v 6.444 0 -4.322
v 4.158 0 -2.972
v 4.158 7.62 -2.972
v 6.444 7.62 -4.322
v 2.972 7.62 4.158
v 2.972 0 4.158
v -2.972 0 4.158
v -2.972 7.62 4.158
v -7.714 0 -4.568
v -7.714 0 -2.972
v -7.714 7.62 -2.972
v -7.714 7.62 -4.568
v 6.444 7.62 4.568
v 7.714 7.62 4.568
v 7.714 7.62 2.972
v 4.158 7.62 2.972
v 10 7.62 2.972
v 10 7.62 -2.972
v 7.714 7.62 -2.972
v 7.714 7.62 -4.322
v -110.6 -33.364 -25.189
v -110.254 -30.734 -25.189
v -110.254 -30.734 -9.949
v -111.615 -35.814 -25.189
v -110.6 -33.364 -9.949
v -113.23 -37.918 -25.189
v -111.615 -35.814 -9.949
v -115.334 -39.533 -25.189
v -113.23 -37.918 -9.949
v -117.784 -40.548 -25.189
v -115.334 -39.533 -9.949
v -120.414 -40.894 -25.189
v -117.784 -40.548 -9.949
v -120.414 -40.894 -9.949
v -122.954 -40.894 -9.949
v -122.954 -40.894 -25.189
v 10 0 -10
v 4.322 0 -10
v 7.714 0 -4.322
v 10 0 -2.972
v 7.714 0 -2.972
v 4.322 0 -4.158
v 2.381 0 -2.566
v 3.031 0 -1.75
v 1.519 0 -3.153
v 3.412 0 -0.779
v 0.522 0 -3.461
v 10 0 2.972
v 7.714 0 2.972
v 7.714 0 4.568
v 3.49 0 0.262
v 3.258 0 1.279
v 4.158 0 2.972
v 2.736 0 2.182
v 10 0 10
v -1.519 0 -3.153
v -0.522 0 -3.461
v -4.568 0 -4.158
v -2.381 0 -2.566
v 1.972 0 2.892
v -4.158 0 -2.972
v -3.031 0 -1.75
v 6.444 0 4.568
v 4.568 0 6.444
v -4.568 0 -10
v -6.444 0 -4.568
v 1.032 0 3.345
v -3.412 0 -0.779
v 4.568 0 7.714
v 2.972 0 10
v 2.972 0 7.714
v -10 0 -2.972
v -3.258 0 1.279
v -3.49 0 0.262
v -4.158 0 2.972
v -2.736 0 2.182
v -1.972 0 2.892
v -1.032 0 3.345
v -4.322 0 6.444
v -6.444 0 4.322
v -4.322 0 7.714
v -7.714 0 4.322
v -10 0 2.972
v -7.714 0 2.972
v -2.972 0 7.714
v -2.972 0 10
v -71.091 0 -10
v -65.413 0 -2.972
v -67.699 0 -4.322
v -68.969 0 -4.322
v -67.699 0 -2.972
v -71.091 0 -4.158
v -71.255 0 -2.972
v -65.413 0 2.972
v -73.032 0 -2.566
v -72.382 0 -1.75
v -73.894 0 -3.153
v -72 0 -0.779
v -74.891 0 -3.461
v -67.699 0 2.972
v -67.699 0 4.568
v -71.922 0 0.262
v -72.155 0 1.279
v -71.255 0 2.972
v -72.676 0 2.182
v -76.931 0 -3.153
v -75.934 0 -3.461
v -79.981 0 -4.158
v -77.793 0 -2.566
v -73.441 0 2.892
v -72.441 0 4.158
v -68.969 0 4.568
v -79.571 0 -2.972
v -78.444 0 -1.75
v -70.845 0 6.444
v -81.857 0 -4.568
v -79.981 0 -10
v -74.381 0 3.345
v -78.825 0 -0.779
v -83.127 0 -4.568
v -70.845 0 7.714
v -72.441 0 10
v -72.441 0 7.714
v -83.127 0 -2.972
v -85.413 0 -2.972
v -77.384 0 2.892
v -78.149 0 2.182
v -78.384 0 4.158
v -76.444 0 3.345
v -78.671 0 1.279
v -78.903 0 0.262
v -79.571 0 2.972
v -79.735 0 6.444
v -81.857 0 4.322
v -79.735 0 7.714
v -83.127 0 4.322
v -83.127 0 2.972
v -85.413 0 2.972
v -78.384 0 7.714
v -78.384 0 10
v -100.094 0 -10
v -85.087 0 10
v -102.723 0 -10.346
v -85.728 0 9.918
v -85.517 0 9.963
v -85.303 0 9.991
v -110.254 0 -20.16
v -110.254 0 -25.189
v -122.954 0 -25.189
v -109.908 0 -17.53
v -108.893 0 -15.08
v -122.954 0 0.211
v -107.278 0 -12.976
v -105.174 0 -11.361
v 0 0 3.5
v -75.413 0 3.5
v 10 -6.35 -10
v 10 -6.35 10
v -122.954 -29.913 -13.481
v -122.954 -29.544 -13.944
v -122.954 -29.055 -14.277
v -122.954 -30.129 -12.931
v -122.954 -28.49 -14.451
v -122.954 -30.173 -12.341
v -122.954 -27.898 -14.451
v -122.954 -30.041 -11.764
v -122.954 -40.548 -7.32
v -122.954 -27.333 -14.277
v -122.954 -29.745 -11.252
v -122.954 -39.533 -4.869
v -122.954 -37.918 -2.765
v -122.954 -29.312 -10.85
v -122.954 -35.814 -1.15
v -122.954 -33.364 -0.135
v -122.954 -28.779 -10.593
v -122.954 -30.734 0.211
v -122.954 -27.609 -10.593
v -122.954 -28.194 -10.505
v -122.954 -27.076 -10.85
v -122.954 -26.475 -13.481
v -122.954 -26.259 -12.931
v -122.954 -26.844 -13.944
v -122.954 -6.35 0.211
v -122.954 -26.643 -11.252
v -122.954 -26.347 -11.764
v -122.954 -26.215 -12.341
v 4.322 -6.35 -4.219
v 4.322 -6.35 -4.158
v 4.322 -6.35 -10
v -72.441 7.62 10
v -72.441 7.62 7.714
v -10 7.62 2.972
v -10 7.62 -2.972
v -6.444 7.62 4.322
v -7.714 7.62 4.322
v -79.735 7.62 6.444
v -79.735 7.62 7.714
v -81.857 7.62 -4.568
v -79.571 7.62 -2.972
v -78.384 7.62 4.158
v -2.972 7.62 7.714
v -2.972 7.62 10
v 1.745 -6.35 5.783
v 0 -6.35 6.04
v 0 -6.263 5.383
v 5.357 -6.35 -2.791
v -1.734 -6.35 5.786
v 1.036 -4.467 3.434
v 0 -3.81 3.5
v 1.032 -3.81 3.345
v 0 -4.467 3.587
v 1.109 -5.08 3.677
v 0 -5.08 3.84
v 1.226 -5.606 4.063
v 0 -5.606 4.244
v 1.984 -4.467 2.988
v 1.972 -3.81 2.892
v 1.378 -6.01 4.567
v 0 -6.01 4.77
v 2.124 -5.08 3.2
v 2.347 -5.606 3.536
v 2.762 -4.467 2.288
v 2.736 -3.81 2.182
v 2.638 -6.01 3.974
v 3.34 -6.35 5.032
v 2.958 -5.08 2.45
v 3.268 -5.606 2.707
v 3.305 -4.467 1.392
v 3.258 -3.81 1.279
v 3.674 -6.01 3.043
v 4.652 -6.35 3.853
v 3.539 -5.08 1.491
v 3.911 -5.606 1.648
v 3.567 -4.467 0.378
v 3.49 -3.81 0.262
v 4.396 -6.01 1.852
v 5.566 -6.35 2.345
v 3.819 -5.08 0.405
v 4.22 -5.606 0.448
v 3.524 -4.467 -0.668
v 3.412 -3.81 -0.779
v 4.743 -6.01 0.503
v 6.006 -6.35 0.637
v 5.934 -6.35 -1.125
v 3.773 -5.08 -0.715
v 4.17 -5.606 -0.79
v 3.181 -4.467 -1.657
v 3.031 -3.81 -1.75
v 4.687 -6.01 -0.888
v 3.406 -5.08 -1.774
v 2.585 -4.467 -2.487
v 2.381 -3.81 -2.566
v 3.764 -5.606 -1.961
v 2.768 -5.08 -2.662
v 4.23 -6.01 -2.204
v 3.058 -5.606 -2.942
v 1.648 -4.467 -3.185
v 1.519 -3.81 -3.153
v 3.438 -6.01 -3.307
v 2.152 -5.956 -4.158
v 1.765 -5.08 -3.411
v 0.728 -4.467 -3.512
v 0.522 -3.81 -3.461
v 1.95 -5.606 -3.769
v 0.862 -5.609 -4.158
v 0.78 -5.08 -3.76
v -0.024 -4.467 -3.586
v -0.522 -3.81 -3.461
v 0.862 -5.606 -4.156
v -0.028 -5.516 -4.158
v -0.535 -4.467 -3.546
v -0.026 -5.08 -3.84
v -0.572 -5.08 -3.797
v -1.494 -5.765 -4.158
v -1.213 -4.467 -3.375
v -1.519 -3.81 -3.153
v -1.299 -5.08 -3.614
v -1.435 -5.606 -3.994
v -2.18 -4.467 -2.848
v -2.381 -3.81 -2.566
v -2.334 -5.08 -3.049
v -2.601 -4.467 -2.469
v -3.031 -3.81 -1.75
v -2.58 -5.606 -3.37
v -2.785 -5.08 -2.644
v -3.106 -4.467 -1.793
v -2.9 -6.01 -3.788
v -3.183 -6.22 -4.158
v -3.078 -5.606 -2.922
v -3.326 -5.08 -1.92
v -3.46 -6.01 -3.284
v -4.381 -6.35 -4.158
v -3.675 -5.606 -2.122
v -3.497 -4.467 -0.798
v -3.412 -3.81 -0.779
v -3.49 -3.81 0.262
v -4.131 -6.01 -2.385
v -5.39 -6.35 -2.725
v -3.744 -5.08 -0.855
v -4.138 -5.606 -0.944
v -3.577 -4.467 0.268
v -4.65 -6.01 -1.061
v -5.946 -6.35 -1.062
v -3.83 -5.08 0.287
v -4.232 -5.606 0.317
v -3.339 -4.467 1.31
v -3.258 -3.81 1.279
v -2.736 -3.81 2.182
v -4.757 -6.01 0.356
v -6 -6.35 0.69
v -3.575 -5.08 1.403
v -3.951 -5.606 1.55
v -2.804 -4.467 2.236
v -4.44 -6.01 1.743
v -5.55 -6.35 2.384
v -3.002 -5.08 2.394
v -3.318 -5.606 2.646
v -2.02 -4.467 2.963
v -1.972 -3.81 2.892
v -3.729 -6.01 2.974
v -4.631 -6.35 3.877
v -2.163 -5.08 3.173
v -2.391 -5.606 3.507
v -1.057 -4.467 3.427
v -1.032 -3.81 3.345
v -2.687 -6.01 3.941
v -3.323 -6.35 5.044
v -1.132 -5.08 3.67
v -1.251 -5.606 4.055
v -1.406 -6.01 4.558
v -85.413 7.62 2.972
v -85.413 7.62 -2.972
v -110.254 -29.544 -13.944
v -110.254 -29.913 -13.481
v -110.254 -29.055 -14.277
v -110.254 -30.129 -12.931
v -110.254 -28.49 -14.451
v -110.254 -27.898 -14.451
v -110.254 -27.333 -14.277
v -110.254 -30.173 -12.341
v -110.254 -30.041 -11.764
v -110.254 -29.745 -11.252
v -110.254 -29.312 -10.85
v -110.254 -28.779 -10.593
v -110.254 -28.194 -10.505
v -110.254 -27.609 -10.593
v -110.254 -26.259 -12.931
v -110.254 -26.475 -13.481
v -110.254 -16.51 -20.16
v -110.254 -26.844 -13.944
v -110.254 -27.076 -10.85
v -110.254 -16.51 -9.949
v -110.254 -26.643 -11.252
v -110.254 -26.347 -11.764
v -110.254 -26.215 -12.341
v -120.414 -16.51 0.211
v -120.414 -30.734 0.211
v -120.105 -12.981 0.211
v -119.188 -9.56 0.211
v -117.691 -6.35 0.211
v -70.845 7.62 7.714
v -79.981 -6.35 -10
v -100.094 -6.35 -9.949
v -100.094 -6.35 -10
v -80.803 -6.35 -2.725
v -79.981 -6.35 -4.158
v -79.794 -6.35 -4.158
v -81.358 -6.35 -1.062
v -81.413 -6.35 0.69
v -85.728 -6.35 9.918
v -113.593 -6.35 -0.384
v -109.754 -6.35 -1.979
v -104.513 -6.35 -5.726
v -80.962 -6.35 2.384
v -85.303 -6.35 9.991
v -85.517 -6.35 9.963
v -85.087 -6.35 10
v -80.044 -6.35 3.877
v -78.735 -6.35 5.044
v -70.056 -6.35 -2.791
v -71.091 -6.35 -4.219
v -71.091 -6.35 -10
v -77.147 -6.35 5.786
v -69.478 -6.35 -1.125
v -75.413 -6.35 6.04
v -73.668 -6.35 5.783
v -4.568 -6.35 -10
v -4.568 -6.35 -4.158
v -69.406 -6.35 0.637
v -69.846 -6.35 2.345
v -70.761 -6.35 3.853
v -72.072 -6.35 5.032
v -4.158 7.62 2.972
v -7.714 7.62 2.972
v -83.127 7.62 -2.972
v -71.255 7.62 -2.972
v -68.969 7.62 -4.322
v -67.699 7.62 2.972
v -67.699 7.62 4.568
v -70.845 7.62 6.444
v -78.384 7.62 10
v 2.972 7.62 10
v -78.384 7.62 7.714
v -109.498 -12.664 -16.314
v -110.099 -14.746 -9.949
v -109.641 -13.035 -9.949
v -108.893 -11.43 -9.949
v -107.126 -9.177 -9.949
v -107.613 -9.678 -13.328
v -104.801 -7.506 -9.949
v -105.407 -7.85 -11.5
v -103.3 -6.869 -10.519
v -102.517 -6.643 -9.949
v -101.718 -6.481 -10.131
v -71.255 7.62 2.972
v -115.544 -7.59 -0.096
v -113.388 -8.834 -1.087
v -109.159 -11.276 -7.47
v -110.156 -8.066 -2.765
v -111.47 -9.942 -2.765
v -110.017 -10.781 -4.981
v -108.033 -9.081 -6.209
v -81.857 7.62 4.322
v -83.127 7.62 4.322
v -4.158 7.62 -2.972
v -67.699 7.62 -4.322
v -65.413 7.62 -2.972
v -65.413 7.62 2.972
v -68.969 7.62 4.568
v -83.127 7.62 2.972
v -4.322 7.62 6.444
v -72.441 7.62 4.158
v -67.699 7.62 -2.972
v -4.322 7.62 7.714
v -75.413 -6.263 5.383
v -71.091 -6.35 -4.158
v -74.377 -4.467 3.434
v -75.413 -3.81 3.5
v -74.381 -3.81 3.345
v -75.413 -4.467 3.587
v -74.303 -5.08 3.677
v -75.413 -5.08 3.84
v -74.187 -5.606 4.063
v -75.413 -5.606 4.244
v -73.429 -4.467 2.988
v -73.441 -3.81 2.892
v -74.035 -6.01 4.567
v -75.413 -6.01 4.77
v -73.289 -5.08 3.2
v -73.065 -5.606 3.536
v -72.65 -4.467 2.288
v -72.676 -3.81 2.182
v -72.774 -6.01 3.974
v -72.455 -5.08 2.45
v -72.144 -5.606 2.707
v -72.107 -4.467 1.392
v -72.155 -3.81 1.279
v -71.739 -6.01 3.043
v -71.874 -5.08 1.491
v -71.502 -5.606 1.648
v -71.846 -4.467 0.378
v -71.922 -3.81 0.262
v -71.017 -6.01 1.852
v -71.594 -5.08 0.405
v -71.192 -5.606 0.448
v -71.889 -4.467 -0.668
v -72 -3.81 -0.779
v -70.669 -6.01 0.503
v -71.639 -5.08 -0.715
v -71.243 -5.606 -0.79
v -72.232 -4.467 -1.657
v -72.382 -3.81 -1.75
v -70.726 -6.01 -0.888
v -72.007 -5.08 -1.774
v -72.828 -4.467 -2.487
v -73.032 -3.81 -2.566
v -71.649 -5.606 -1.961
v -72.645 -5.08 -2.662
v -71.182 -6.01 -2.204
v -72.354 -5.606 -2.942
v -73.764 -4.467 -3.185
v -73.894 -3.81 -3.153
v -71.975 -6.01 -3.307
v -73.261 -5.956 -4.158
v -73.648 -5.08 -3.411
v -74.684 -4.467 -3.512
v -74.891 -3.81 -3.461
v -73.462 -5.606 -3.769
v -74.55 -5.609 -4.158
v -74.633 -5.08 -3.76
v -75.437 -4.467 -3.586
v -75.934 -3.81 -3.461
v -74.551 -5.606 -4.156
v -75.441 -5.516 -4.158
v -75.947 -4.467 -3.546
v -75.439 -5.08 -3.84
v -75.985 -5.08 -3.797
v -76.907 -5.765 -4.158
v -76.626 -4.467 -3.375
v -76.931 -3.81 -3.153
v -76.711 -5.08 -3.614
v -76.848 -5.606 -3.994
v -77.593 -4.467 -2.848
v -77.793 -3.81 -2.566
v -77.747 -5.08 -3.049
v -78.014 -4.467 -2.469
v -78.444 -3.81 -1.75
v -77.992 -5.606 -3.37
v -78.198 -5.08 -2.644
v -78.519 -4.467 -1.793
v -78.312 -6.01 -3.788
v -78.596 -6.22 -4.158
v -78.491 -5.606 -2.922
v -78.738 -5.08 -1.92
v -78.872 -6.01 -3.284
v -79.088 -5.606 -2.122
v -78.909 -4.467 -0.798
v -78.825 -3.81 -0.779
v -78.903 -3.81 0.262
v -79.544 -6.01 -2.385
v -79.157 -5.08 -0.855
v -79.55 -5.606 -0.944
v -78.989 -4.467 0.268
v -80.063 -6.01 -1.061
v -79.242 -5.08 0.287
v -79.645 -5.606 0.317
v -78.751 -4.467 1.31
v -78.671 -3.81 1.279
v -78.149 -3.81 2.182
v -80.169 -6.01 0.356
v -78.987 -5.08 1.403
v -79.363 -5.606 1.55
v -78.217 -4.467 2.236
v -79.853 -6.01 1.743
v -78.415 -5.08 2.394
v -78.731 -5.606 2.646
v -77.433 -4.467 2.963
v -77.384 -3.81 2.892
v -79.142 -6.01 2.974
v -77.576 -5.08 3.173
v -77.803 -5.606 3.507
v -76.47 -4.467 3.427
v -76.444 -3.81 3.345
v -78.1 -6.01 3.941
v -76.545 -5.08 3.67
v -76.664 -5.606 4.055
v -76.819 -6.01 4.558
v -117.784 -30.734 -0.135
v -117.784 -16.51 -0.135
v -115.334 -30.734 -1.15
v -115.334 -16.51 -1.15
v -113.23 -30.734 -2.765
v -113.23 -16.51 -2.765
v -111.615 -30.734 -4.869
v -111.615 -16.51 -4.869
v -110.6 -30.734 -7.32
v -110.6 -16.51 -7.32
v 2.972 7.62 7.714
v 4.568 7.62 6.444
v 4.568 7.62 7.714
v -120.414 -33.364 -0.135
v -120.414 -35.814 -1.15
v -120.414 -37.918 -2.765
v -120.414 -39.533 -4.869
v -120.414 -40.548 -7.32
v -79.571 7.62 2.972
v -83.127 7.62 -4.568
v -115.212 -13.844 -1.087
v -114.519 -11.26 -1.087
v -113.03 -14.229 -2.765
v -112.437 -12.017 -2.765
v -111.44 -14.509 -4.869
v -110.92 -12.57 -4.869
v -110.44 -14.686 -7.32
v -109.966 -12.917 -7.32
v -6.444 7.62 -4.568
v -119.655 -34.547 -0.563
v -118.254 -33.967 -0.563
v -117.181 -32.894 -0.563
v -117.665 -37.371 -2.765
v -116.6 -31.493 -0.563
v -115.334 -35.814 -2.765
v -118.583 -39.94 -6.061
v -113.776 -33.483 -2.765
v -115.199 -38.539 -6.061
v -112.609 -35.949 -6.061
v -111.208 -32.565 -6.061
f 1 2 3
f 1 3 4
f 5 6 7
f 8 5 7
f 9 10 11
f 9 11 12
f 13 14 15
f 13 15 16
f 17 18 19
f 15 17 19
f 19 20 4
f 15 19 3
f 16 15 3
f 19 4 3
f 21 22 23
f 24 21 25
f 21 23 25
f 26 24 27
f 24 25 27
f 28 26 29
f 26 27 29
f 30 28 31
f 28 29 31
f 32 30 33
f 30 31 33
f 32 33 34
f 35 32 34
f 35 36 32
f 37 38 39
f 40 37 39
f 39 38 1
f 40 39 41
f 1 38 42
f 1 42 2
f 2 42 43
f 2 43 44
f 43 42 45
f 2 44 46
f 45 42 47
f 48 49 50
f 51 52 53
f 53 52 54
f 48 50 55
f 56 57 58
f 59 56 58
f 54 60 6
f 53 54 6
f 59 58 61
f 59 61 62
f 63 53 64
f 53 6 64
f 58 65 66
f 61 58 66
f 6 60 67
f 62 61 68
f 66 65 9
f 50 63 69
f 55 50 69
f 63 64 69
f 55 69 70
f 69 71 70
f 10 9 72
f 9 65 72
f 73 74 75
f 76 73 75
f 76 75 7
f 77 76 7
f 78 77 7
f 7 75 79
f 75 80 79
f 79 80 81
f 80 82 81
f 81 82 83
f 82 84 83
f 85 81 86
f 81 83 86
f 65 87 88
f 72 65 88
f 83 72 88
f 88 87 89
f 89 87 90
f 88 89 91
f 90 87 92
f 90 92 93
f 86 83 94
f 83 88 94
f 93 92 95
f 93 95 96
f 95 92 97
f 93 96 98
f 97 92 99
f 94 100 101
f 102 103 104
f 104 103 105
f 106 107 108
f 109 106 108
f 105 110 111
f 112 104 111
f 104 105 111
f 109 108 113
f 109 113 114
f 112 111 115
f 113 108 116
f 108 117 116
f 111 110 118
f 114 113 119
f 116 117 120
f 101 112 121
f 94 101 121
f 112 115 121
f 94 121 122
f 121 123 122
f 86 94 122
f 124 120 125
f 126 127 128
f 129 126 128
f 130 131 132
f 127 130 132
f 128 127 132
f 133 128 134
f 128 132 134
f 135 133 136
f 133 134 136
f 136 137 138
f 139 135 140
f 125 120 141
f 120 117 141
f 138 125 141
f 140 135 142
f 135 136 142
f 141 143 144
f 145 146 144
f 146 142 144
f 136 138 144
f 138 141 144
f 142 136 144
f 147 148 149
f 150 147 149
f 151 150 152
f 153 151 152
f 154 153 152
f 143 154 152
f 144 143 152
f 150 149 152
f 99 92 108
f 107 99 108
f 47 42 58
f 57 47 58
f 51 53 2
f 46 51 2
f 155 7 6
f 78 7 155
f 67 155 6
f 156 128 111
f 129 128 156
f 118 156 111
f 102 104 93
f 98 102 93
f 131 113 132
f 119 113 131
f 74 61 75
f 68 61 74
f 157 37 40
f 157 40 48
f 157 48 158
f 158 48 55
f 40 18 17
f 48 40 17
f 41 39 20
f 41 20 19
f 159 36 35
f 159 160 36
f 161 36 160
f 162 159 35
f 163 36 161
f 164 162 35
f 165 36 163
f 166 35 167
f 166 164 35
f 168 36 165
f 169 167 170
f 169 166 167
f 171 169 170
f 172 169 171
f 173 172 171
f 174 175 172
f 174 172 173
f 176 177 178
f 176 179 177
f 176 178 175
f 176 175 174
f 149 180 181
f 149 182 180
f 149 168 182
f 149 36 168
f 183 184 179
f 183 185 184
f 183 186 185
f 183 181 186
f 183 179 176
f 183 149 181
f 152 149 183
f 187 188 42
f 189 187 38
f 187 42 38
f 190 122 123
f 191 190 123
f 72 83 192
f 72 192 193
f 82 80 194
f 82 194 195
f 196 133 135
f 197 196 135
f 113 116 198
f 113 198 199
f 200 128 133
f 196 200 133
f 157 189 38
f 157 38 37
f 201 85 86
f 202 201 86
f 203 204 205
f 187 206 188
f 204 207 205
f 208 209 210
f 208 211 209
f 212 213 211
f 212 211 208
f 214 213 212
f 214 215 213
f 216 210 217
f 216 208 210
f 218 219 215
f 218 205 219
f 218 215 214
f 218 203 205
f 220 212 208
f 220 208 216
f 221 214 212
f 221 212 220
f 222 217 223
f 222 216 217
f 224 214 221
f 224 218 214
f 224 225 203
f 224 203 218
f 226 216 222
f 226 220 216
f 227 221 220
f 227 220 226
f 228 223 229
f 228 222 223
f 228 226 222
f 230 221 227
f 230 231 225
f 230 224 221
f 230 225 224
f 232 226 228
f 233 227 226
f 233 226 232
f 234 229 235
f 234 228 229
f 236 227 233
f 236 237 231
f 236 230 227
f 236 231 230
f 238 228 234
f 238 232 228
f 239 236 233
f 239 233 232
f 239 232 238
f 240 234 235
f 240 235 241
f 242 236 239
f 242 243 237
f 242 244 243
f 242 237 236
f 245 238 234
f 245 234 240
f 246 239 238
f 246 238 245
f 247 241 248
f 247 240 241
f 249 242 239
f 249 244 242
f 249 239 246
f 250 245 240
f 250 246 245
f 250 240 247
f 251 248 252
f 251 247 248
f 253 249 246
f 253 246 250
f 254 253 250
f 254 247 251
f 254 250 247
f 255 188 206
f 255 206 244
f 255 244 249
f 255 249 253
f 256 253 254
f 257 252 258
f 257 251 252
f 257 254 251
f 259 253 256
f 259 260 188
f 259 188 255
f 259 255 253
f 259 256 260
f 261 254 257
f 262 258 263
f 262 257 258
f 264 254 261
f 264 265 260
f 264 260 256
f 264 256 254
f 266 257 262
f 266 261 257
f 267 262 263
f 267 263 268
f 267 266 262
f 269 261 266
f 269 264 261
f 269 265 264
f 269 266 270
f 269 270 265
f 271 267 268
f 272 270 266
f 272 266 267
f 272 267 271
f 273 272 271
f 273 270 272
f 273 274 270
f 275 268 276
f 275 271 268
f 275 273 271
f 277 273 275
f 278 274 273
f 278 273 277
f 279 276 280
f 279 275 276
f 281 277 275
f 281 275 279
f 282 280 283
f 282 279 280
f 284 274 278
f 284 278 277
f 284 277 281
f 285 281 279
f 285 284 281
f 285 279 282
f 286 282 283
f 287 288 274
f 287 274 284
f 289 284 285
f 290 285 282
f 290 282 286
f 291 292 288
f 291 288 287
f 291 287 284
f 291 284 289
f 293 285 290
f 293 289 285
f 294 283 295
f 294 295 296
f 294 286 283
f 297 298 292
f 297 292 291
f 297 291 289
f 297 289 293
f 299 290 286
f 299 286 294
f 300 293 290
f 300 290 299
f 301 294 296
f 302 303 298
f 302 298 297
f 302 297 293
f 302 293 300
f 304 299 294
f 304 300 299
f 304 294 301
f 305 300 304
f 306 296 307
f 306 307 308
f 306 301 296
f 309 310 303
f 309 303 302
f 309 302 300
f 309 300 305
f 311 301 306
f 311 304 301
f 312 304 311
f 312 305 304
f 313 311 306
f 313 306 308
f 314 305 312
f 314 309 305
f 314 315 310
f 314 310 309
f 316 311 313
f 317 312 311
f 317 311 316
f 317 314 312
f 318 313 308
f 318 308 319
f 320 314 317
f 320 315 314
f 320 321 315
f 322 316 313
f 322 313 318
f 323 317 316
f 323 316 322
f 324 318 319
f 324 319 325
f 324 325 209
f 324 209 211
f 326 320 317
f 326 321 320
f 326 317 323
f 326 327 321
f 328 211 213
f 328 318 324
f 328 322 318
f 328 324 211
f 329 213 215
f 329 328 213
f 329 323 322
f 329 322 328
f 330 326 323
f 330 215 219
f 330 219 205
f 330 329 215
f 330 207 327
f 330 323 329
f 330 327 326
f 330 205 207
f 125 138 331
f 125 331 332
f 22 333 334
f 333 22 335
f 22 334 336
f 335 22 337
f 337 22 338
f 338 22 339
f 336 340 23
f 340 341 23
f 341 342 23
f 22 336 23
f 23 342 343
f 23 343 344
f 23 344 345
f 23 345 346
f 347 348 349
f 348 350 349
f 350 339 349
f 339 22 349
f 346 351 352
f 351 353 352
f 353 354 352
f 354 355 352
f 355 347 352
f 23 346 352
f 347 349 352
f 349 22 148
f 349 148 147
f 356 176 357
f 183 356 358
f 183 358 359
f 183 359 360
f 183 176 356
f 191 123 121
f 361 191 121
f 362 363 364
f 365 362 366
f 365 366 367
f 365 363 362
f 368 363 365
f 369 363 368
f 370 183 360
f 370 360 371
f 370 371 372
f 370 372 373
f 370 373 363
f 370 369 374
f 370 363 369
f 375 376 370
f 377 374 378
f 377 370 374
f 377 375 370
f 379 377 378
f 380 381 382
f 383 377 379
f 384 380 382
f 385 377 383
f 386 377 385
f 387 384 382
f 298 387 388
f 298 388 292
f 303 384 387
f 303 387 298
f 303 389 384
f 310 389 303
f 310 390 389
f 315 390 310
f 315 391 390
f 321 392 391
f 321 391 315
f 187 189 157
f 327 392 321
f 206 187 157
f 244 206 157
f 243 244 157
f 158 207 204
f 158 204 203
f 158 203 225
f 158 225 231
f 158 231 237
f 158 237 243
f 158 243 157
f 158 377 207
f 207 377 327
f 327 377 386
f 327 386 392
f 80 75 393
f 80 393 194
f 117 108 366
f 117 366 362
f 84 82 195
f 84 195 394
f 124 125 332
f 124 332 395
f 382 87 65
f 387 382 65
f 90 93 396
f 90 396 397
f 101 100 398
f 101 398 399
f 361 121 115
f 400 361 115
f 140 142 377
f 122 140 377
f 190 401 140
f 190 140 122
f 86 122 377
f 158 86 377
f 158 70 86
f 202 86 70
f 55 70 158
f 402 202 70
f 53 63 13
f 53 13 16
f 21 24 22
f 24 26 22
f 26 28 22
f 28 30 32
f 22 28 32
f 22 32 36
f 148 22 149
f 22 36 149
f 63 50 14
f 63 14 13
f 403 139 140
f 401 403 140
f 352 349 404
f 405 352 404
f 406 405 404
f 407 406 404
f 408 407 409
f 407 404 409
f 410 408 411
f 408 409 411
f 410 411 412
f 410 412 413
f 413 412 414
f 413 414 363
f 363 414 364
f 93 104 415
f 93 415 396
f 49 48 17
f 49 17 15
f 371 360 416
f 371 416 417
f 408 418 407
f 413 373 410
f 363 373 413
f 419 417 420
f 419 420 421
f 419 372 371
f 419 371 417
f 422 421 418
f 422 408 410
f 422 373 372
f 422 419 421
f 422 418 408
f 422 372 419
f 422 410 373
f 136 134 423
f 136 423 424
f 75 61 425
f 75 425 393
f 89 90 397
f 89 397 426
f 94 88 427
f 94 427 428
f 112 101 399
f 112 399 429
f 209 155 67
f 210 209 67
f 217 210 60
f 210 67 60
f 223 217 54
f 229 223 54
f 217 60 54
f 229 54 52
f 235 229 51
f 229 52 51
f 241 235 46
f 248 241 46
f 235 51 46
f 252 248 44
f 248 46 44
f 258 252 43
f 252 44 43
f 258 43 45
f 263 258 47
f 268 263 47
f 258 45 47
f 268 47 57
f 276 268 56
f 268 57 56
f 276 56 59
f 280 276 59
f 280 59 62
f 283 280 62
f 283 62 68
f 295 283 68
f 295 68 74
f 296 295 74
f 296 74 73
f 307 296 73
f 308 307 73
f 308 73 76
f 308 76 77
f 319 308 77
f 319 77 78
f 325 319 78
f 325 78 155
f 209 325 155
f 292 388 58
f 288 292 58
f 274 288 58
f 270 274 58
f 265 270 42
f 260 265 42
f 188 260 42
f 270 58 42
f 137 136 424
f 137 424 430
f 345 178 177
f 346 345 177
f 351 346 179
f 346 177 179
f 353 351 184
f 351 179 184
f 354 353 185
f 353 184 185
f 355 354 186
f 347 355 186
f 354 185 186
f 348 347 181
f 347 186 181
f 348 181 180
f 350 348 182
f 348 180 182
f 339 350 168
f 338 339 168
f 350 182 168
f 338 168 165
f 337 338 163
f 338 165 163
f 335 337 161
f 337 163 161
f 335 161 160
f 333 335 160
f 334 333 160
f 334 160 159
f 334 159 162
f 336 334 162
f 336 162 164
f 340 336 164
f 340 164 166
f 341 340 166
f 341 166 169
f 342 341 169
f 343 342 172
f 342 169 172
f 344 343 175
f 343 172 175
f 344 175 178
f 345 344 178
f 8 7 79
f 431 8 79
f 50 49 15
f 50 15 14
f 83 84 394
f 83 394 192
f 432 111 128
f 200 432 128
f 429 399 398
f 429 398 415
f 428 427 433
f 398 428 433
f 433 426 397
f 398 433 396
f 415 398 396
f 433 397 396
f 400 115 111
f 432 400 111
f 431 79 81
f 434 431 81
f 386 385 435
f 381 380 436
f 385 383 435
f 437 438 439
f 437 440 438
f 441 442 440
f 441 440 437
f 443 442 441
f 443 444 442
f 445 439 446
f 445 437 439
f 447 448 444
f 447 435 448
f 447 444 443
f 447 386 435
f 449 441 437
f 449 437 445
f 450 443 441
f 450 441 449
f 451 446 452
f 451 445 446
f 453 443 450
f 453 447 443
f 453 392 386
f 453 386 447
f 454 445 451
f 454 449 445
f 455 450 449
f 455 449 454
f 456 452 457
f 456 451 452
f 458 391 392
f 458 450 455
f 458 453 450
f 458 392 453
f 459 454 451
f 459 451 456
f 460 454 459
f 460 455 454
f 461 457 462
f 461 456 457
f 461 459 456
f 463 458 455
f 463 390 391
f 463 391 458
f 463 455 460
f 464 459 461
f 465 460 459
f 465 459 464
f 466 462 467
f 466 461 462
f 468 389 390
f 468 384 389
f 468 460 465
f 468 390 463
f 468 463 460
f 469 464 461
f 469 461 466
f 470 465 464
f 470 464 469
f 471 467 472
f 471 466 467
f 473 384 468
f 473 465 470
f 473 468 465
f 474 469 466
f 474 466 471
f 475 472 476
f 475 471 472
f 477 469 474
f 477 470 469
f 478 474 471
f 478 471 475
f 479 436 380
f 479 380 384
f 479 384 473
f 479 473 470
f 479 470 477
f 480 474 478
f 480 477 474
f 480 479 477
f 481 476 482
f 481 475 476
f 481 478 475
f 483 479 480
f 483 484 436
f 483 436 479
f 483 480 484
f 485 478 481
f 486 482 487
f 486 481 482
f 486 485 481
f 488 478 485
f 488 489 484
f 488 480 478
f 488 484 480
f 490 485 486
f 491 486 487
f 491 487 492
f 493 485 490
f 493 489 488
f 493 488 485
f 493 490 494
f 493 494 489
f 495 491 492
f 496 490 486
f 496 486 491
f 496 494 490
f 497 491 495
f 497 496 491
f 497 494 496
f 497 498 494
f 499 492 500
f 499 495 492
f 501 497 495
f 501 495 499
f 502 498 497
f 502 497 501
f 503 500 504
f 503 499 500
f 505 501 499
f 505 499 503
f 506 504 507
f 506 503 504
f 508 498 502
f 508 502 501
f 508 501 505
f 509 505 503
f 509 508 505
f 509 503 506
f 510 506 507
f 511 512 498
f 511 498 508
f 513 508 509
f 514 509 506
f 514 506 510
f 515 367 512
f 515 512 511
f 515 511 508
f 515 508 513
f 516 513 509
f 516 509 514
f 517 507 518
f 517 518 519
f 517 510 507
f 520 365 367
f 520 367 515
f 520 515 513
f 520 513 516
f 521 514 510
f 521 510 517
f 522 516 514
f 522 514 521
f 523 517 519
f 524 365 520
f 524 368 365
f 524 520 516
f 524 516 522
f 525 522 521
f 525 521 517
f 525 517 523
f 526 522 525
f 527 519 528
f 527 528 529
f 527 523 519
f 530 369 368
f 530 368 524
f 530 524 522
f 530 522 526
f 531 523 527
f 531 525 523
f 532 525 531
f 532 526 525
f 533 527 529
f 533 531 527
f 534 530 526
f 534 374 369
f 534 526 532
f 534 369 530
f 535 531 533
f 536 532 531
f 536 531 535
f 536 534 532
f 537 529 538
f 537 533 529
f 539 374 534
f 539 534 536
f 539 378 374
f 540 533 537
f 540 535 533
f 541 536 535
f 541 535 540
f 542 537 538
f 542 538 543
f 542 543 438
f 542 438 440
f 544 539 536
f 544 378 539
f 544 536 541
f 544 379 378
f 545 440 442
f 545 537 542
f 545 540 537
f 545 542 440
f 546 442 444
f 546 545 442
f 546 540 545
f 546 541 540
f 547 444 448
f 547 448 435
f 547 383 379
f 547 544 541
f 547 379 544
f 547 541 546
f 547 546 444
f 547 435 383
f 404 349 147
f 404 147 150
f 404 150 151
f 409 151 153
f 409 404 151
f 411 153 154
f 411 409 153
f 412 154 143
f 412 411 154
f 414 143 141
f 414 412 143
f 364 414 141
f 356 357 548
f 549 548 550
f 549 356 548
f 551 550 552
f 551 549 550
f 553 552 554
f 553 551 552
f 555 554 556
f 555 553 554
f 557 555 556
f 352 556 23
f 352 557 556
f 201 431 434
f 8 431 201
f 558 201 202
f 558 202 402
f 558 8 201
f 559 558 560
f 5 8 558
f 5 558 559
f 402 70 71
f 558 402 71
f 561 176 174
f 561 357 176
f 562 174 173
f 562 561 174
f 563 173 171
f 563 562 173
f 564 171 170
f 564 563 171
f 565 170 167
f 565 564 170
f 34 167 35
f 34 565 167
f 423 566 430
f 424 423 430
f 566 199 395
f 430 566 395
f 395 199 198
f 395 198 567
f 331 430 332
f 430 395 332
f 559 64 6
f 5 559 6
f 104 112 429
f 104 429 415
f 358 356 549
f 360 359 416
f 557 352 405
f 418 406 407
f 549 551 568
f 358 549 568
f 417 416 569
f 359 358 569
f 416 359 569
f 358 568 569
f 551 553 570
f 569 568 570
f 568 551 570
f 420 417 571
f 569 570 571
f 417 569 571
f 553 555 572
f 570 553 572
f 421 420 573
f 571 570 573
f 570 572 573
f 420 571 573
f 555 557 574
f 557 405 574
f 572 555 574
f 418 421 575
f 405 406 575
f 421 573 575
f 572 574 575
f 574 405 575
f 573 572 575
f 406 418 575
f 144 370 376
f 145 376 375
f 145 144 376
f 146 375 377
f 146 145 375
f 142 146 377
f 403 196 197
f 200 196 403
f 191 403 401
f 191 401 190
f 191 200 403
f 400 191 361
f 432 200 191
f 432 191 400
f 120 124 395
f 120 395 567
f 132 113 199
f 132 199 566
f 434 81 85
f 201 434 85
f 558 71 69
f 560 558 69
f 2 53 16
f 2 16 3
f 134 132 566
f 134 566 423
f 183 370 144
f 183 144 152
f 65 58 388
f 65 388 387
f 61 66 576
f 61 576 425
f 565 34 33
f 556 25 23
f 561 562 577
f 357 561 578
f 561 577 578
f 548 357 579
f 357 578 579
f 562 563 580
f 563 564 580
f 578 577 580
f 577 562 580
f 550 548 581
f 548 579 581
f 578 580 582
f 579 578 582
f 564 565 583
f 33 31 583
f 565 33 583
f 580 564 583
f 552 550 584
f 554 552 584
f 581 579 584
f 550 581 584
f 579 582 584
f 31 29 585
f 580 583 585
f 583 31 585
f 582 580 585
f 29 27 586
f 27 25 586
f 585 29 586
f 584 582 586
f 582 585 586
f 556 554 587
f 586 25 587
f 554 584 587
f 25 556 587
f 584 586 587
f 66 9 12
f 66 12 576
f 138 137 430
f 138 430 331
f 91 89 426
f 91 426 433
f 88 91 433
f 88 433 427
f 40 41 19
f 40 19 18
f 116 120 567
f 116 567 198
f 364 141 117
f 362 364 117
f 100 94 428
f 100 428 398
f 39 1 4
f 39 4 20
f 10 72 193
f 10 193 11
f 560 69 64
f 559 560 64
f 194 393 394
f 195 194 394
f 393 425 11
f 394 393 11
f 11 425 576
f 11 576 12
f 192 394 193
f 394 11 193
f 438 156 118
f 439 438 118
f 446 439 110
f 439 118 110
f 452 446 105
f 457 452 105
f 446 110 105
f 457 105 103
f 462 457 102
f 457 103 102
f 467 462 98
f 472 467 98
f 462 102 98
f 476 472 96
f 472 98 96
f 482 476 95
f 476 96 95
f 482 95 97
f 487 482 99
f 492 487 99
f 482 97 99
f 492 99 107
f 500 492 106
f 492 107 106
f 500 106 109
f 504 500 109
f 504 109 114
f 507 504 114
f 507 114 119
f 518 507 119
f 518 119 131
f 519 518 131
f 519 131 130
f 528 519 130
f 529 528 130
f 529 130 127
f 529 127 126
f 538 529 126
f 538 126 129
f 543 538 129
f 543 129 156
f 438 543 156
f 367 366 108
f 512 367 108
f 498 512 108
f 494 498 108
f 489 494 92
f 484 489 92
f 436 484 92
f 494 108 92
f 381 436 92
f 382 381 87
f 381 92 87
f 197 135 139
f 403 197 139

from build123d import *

# Parameters (mm, degrees)
BOSS_EXTRUDE1_DEPTH   = 7.62
BOSS_EXTRUDE1_2_DEPTH = 7.62
BOSS_EXTRUDE1_3_DEPTH = 7.62
BOSS_EXTRUDE1_4_DEPTH = 7.62
SKETCH2_W             = 132.9538108
SKETCH2_H             = 20
BOSS_EXTRUDE2_DEPTH   = 6.35
LPATTERN2_COUNT       = 2
LPATTERN2_PITCH       = 75.4126
CUT_EXTRUDE1_DEPTH    = 125.148300392
FILLET1_R             = 2.54
SKETCH13_R            = 3.5
CUT_EXTRUDE5_DEPTH    = 124.59491895
FILLET6_R             = 2.54
SKETCH14_W            = 8.89
SKETCH14_H            = 5.842
CUT_EXTRUDE6_DEPTH    = 125.148300392
SKETCH15_W            = 25.4
SKETCH15_H            = 40.894
BOSS_EXTRUDE3_DEPTH   = 12.7
FILLET15_R            = 10.16
FILLET16_R            = 10.16
FILLET17_R            = 10.16
FILLET18_R            = 10.16
SKETCH18_R            = 1.984375
CUT_EXTRUDE9_DEPTH    = 12.7


with BuildPart() as part:
    # Sketch1 → Boss-Extrude1 (new body)
    with BuildSketch(Plane(origin=(0, 0, 0), x_dir=(1, 0, 0), z_dir=(0, 1, 0))):
        Polygon((2.9718, 10), (-2.9718, 10), (-2.9718, 7.714), (-4.567901235, 7.714), (-4.567901235, 6.444), (-2.9718, 4.158), (2.9718, 4.158), (4.322098765, 6.444), (4.322098765, 7.714), (2.9718, 7.714), align=None)
    boss_extrude1 = extrude(amount=BOSS_EXTRUDE1_DEPTH)



with BuildPart() as body_2:
    # Sketch1 → Boss-Extrude1 2 (new body)
    with BuildSketch(Plane(origin=(0, 0, 0), x_dir=(1, 0, 0), z_dir=(0, 1, 0))):
        Polygon((4.158, -2.9718), (4.158, 2.9718), (6.444, 4.322098765), (7.714, 4.322098765), (7.714, 2.9718), (10, 2.9718), (10, -2.9718), (7.714, -2.9718), (7.714, -4.567901235), (6.444, -4.567901235), align=None)
    boss_extrude1_2 = extrude(amount=BOSS_EXTRUDE1_2_DEPTH)


with BuildPart() as body_3:
    # Sketch1 → Boss-Extrude1 3 (new body)
    with BuildSketch(Plane(origin=(0, 0, 0), x_dir=(1, 0, 0), z_dir=(0, 1, 0))):
        Polygon((-10, -2.9718), (-10, 2.9718), (-7.714, 2.9718), (-7.714, 4.567901235), (-6.444, 4.567901235), (-4.158, 2.9718), (-4.158, -2.9718), (-6.444, -4.322098765), (-7.714, -4.322098765), (-7.714, -2.9718), align=None)
    boss_extrude1_3 = extrude(amount=BOSS_EXTRUDE1_3_DEPTH)


with BuildPart() as body_4:
    # Sketch1 → Boss-Extrude1 4 (new body)
    with BuildSketch(Plane(origin=(0, 0, 0), x_dir=(1, 0, 0), z_dir=(0, 1, 0))):
        Polygon((4.567901235, -6.444), (2.9718, -4.158), (-2.9718, -4.158), (-4.322098765, -6.444), (-4.322098765, -7.714), (-2.9718, -7.714), (-2.9718, -10), (2.9718, -10), (2.9718, -7.714), (4.567901235, -7.714), align=None)
    boss_extrude1_4 = extrude(amount=BOSS_EXTRUDE1_4_DEPTH)


with BuildPart() as part_1:
    add(part.part)

    add(body_2.part)  # Boss-Extrude2 merges body 2

    add(body_3.part)  # Boss-Extrude2 merges body 3

    add(body_4.part)  # Boss-Extrude2 merges body 4
    # Sketch2 → Boss-Extrude2 (add)
    with BuildSketch(Plane.XZ):
        with Locations((-56.4769054, 0)):
            Rectangle(SKETCH2_W, SKETCH2_H)
    extrude(amount=BOSS_EXTRUDE2_DEPTH)

    # LPattern2: Boss-Extrude1, Boss-Extrude1 2, Boss-Extrude1 3, Boss-Extrude1 4 ×2
    with Locations(*[(-i * LPATTERN2_PITCH, 0, 0) for i in range(1, LPATTERN2_COUNT)]):
        add(boss_extrude1)
        add(boss_extrude1_2)
        add(boss_extrude1_3)
        add(boss_extrude1_4)

    # Sketch4 → Cut-Extrude1 (cut, through all)
    with BuildSketch(Plane(origin=(0, -6.35, 0), x_dir=(-1, 0, 0), z_dir=(0, -1, 0))):
        Polygon((122.9538108, -10), (85.4126108, -10), (122.9538108, -0.2108), align=None)
    extrude(amount=-CUT_EXTRUDE1_DEPTH, mode=Mode.SUBTRACT)

    # Fillet1
    fillet1_edges = [part_1.edges().sort_by_distance(p)[0] for p in [
        (-85.4126108, -3.175, 10),
    ]]
    fillet(fillet1_edges, radius=FILLET1_R)

    # Sketch13 → Cut-Extrude5 (cut, through all)
    with BuildSketch(Plane(origin=(0, 0, 0), x_dir=(1, 0, 0), z_dir=(0, 1, 0))):
        with Locations(Location((0, 0, 0), (0, 0, 270))):
            Circle(SKETCH13_R)
        with Locations(Location((-75.4126, 0, 0), (0, 0, 270))):
            Circle(SKETCH13_R)
    extrude(amount=-CUT_EXTRUDE5_DEPTH, mode=Mode.SUBTRACT)

    # Fillet6
    fillet6_edges = [part_1.edges().sort_by_distance(p)[0] for p in [
        (0, -6.35, -3.5),
        (-75.4126, -6.35, -3.5),
    ]]
    fillet(fillet6_edges, radius=FILLET6_R)

    # Sketch14 → Cut-Extrude6 (cut, through all)
    with BuildSketch(Plane(origin=(0, 7.62, 0), x_dir=(1, 0, 0), z_dir=(0, 1, 0))):
        with Locations((-0.122901235, 7.079)):
            Rectangle(SKETCH14_W, SKETCH14_H)
        with Locations((-75.535501235, 7.079)):
            Rectangle(SKETCH14_W, SKETCH14_H)
    extrude(amount=-CUT_EXTRUDE6_DEPTH, mode=Mode.SUBTRACT)

    # Sketch15 → Boss-Extrude3 (add)
    with BuildSketch(Plane.ZY.offset(122.9538108)):
        with Locations((-12.4892, -20.447)):
            Rectangle(SKETCH15_W, SKETCH15_H)
    extrude(amount=-BOSS_EXTRUDE3_DEPTH)

    # Fillet15
    fillet15_edges = [part_1.edges().sort_by_distance(p)[0] for p in [
        (-110.2538108, -6.35, -4.8946),
    ]]
    fillet(fillet15_edges, radius=FILLET15_R)

    # Fillet16
    fillet16_edges = [part_1.edges().sort_by_distance(p)[0] for p in [
        (-110.2538108, -8.255, -10),
    ]]
    fillet(fillet16_edges, radius=FILLET16_R)

    # Fillet17
    fillet17_edges = [part_1.edges().sort_by_distance(p)[0] for p in [
        (-110.2538108, -40.894, -12.4892),
    ]]
    fillet(fillet17_edges, radius=FILLET17_R)

    # Fillet18
    fillet18_edges = [part_1.edges().sort_by_distance(p)[0] for p in [
        (-107.278015697, -9.325795103, 0.2108),
        (-121.6838108, -40.894, 0.2108),
        (-110.2538108, -23.622, 0.2108),
        (-113.229605903, -37.918204897, 0.2108),
    ]]
    fillet(fillet18_edges, radius=FILLET18_R)

    # Sketch18 → Cut-Extrude9 (cut)
    with BuildSketch(Plane.ZY.offset(122.9538108)):
        with Locations((-12.4892, -28.194)):
            Circle(SKETCH18_R)
    extrude(amount=-CUT_EXTRUDE9_DEPTH, mode=Mode.SUBTRACT)


solid = part_1.part
